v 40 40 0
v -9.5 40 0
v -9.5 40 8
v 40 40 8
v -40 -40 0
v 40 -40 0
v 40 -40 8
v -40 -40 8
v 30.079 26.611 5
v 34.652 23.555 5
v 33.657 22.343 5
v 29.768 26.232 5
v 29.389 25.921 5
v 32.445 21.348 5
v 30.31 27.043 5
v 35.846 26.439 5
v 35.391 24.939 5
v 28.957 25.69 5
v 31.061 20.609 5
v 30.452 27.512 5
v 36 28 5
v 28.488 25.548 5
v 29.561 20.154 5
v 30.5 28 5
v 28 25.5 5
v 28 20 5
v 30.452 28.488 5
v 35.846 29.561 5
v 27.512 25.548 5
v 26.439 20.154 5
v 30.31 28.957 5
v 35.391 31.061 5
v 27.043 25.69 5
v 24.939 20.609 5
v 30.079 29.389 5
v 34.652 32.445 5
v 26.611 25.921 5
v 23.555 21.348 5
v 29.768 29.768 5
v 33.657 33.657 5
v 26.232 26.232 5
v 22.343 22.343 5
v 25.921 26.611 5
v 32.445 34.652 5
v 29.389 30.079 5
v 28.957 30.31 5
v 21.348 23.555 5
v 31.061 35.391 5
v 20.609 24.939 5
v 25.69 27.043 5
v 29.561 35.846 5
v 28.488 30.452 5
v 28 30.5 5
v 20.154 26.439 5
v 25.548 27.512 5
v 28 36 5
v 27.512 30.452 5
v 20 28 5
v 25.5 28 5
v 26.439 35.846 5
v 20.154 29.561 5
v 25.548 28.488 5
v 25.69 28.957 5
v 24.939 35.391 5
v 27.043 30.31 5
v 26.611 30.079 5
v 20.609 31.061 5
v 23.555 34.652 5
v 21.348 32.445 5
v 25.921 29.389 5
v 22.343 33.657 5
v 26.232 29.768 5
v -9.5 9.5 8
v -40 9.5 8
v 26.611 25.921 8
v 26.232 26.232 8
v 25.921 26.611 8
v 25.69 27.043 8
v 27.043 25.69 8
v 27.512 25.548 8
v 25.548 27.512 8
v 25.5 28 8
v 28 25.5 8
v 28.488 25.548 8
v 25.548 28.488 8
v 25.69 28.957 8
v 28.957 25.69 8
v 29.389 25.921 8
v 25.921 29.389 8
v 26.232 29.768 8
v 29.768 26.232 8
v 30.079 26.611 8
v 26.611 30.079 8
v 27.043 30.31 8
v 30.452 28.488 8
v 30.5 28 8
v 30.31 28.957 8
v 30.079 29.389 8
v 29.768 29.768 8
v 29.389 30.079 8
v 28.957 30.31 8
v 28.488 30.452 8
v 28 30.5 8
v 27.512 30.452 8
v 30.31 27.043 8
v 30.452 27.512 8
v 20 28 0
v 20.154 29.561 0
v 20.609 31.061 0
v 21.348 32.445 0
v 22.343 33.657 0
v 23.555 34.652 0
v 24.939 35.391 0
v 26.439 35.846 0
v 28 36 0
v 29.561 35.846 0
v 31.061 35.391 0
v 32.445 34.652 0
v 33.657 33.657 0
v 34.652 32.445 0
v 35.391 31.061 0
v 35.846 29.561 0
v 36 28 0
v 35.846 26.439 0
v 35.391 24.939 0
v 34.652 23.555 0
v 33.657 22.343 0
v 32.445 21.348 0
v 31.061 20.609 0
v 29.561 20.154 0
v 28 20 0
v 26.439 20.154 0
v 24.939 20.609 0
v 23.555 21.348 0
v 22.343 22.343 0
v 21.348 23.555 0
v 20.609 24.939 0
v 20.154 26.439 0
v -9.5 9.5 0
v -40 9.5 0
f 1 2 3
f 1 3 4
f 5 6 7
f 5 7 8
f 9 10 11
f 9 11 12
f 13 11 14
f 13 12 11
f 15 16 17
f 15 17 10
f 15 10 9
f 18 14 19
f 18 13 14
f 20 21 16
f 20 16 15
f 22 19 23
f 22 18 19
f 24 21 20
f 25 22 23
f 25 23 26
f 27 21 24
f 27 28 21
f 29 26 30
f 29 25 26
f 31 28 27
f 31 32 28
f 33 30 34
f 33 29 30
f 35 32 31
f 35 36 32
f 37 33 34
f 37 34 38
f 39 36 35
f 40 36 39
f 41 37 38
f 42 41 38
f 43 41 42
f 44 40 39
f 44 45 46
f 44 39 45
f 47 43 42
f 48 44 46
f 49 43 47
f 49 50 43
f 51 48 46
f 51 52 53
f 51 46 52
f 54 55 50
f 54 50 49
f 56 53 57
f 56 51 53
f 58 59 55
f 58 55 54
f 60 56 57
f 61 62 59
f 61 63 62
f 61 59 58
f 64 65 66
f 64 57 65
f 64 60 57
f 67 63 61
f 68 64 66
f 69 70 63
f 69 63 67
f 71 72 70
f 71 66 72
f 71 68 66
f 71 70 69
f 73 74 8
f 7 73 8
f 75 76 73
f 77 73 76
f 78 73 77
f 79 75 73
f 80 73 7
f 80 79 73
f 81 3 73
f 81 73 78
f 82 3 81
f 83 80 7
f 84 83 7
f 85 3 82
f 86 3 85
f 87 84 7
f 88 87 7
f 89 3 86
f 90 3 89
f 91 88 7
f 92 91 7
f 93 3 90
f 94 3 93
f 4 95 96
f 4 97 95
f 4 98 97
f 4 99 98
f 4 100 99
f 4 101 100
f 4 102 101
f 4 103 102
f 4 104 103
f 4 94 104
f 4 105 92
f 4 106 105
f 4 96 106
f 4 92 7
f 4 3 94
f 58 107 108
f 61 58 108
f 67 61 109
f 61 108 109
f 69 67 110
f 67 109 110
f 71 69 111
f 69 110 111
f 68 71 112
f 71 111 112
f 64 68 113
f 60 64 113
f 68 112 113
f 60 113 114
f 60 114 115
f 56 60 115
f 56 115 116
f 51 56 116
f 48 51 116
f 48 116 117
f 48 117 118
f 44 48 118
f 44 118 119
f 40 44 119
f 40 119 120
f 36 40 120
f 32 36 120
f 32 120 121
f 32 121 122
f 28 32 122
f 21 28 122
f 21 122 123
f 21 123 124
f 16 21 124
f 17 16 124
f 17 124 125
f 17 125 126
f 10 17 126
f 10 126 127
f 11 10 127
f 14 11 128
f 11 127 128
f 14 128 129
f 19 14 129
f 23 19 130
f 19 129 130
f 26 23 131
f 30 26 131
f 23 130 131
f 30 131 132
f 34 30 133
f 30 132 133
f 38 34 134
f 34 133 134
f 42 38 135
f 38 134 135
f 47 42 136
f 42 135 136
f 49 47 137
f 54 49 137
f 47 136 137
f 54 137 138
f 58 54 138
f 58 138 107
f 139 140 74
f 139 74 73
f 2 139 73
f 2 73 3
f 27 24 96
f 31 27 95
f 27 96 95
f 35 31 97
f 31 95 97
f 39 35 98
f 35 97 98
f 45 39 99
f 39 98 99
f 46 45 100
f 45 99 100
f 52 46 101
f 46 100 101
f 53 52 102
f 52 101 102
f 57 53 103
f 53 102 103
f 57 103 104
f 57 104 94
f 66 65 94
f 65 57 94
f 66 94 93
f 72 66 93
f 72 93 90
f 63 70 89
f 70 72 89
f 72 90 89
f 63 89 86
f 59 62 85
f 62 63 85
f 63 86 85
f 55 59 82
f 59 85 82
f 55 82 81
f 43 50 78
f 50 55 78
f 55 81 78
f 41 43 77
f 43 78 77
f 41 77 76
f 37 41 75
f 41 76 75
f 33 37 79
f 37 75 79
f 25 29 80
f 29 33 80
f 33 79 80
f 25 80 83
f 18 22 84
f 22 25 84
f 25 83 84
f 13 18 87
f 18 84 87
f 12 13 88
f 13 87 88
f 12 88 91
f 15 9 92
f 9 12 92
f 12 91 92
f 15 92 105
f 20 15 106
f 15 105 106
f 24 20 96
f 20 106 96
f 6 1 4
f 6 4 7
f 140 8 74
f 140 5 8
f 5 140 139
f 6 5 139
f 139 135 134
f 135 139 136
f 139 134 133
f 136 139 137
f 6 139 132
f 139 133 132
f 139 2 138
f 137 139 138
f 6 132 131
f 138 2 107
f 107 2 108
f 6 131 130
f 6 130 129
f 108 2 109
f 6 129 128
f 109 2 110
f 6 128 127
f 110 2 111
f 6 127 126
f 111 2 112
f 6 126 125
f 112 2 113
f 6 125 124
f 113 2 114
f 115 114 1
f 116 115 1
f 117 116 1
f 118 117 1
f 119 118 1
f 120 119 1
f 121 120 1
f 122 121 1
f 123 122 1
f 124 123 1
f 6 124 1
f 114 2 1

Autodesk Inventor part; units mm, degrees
ref_plane "YZ Plane" through (0, 0, 0) normal (1, 0, 0) x (0, 1, 0)
ref_plane "XZ Plane" through (0, 0, 0) normal (0, 1, 0) x (-1, 0, 0)
ref_plane "XY Plane" through (0, 0, 0) normal (0, 0, 1) x (1, 0, 0)
sketch "Sketch1" plane through (0, 0, 0) normal (0, 0, 1) x (1, 0, 0)
  line L0 (-40, 40) -> (40, 40)
  line L1 (40, 40) -> (40, -40)
  line L2 (40, -40) -> (-40, -40)
  line L3 (-40, -40) -> (-40, 40)
  point P0 (0, 0)
  dimension "d0" = 80
  dimension "d1" = 80
  dimension "d4" = 40
  dimension "d5" = 40
extrude "Extrusion1" add sketch "Sketch1" along normal blind 8
sketch "Sketch2" plane through (0, 0, 8) normal (0, 0, 1) x (1, 0, 0)
  circle A0 centre (28, 28) radius 2.5
  line L0 (40, 40) -> (-40, 40) projected
  line L1 (40, -40) -> (40, 40) projected
  point P0 (0, 0)
  dimension "d6" = 5
  dimension "d7" = 12
  dimension "d8" = 12
extrude "Extrusion2" cut sketch "Sketch2" against normal through all
sketch "Sketch3" plane through (0, 0, 0) normal (0, 0, -1) x (-1, 0, 0)
  circle A0 centre (-28, 28) radius 2.5 projected
  circle A1 centre (-28, 28) radius 8
  point P0 (0, 0)
  dimension "d11" = 16
extrude "Extrusion3" cut sketch "Sketch3" against normal blind 5
sketch "Sketch4" plane through (0, 0, 0) normal (0, 0, -1) x (-1, 0, 0)
  line L0 (40, 40) -> (-40, 40) projected
  line L1 (9.5, 40) -> (40, 40)
  line L2 (40, 40) -> (40, 9.5)
  line L3 (40, 9.5) -> (9.5, 9.5)
  line L4 (9.5, 9.5) -> (9.5, 40)
  line L5 (40, 40) -> (40, -40) projected
  point P0 (0, 0)
  dimension "d14" = 30.5
  dimension "d15" = 30.5
  dimension "d16" = 0
extrude "Extrusion4" cut sketch "Sketch4" against normal through all
equation "\"d4\" = 0.5 * d0"
equation "\"d5\" = 0.5 * d1"
equation "\"d8\" = d7"
properties part number "top guide support plate"
